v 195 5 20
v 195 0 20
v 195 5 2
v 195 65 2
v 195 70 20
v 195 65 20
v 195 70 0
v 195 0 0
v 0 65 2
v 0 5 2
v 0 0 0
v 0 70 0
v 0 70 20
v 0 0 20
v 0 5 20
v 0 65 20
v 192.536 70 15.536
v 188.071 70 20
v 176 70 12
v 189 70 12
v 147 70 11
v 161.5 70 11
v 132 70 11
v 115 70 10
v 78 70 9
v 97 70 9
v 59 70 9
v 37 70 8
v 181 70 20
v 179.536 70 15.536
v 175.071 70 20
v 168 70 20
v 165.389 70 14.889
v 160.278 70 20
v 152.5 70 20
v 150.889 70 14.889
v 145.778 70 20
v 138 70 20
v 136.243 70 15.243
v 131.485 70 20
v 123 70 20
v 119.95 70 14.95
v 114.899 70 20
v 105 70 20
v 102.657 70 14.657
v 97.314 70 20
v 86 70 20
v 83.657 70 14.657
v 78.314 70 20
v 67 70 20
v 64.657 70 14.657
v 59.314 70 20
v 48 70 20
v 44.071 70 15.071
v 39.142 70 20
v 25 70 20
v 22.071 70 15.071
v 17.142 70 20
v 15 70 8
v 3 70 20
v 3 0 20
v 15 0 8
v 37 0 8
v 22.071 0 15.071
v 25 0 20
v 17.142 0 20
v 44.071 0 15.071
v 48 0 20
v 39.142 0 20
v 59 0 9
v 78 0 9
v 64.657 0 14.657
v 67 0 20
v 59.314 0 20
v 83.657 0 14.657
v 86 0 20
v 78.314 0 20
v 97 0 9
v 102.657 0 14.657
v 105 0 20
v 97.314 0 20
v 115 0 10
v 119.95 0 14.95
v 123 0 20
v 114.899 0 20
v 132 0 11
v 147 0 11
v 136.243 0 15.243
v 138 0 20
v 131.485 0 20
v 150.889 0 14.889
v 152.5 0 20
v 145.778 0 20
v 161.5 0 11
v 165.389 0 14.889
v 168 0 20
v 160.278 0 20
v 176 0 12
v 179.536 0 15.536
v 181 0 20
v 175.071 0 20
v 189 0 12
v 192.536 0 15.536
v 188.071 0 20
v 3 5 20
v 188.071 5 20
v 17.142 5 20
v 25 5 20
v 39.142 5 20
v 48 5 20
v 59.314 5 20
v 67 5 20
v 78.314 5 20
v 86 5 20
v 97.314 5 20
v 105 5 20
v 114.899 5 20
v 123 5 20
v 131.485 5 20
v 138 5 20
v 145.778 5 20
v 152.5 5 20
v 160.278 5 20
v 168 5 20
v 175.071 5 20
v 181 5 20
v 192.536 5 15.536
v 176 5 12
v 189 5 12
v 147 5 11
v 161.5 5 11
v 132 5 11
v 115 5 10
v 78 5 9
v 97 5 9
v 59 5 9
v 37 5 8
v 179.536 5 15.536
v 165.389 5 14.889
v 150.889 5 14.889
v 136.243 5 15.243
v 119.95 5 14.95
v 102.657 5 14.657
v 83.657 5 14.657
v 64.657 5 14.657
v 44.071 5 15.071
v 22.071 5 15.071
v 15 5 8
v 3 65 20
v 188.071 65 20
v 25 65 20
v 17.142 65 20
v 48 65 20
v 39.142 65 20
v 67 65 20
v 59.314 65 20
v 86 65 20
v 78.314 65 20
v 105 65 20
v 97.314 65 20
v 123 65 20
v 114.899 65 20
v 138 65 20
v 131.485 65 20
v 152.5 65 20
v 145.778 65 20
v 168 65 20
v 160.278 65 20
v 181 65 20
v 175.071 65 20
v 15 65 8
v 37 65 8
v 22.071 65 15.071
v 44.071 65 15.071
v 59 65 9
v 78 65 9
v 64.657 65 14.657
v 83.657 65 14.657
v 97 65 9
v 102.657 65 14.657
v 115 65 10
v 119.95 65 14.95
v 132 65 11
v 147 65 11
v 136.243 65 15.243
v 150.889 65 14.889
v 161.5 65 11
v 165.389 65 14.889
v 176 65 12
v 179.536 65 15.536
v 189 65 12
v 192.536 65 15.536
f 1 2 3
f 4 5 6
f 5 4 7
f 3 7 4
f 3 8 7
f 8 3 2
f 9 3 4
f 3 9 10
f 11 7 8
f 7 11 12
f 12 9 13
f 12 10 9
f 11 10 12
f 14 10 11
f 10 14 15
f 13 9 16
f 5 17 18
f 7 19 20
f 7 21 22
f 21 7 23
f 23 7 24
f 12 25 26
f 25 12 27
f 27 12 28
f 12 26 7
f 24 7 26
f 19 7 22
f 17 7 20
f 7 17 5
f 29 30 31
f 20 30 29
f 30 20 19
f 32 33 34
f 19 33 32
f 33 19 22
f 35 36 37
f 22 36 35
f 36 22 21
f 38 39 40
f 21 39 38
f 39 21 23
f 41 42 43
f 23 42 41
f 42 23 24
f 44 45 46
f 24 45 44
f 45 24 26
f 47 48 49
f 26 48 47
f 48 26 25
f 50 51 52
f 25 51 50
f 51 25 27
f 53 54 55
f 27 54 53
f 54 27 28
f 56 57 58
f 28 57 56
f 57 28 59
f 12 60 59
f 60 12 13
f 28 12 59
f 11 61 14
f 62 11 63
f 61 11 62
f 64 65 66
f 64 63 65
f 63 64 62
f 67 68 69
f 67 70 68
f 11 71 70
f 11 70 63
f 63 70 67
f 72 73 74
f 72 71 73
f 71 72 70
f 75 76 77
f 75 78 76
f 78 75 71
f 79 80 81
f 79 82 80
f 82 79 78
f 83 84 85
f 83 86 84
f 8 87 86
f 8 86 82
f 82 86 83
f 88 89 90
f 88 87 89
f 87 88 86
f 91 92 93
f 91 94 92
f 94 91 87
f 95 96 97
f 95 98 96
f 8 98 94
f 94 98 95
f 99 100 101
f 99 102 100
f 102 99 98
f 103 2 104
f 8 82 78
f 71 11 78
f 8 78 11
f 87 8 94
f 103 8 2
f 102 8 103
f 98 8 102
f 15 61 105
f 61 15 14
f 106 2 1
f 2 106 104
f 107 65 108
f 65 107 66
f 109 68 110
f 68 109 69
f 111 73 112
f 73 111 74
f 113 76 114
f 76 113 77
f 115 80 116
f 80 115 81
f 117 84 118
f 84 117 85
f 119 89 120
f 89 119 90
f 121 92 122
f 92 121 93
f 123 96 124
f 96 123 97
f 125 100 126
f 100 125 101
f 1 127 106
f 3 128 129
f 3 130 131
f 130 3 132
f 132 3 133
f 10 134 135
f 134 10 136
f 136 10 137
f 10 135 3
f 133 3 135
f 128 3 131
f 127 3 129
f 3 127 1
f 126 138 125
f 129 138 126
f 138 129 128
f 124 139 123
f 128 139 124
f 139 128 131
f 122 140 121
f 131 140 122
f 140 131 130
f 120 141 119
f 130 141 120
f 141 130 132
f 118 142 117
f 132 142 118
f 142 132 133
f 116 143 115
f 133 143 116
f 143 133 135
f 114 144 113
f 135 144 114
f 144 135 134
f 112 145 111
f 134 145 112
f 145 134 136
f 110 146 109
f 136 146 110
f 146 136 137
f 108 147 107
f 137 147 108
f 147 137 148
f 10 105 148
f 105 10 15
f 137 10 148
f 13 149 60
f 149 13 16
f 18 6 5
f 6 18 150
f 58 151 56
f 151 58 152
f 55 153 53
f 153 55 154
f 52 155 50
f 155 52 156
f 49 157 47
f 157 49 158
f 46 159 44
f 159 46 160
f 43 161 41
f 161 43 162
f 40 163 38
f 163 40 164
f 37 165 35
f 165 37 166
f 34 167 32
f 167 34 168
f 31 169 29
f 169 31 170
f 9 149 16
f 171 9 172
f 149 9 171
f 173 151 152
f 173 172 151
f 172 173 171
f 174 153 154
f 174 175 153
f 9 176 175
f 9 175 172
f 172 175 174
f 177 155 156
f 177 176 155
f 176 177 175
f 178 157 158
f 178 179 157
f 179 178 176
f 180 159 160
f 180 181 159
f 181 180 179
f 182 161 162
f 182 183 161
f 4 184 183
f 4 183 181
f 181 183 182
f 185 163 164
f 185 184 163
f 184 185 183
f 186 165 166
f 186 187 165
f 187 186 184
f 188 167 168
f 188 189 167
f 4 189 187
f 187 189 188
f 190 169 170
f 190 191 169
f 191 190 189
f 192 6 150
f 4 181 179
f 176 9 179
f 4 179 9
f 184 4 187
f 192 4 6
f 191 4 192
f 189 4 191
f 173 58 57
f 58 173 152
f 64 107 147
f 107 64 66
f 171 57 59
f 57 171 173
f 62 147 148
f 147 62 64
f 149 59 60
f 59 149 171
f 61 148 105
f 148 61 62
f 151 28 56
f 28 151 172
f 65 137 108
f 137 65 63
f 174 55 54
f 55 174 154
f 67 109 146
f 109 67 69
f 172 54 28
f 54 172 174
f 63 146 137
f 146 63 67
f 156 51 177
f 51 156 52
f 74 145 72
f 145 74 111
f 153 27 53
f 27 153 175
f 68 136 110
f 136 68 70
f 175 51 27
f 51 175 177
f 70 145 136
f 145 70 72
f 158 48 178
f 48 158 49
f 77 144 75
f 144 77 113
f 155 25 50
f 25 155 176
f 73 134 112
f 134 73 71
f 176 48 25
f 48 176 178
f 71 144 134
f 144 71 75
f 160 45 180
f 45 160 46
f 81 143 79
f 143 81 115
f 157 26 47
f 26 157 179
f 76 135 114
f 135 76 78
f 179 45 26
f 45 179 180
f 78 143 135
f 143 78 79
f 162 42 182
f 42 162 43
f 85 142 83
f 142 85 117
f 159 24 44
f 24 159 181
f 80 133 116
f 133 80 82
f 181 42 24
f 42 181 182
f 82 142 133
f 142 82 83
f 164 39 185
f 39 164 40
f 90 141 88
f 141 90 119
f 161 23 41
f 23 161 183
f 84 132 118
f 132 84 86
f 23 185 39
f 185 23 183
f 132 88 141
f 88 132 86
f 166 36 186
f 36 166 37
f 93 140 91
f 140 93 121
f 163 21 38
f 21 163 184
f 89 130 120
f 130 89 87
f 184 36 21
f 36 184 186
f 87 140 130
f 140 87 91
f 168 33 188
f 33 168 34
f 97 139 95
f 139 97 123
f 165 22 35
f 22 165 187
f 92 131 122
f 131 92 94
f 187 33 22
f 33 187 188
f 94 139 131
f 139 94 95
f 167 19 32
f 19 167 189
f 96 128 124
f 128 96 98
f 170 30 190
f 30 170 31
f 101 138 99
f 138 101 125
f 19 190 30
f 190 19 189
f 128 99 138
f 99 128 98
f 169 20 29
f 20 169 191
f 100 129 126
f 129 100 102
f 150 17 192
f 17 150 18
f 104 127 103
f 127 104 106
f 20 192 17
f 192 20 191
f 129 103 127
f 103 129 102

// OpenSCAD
width = [10, 10,  8,  8,  8,  7,  6, 5.5, 5.5,  5,  5];
space = [12, 12, 11, 11, 10, 10,  9,   9,   9,  8,  8];
vrtcl = [ 0,  0,  1,  1,  1,  2,  3,   3,   3,  4,  4];

function sum (v, i = 0, r = 0) = i < len (v) ? sum (v, i + 1, r + v [i]) : r;
function reverse (list) = [for (i = [len (list) - 1: -1 : 0]) list [i]];
function subarray (list, begin = 0, end = -1) = [
  let (end = end < 0 ? len (list) : end)
    for (i = [begin : 1 : end - 1])
      list [i]
];

rwidth = reverse (width);
rspace = reverse (space);

module base () {
  translate ([0, 0, 0])
    cube ([195, 70, 2]);
  translate ([0, 0, 0])
    cube ([195, 5, 20]);
  translate ([0, 65, 0])
    cube ([195, 5, 20]);
}

difference () {
  base ();

  for (i = [0 : len (width) - 1]) {
    translate ([15 + sum (subarray (space, 0, i)) + sum (subarray (width, 0, i)), -0.01, 8 + vrtcl [i]])
      rotate ([0, 315, 0])
        cube ([width [i], 70.02, 25]);
  }
}
